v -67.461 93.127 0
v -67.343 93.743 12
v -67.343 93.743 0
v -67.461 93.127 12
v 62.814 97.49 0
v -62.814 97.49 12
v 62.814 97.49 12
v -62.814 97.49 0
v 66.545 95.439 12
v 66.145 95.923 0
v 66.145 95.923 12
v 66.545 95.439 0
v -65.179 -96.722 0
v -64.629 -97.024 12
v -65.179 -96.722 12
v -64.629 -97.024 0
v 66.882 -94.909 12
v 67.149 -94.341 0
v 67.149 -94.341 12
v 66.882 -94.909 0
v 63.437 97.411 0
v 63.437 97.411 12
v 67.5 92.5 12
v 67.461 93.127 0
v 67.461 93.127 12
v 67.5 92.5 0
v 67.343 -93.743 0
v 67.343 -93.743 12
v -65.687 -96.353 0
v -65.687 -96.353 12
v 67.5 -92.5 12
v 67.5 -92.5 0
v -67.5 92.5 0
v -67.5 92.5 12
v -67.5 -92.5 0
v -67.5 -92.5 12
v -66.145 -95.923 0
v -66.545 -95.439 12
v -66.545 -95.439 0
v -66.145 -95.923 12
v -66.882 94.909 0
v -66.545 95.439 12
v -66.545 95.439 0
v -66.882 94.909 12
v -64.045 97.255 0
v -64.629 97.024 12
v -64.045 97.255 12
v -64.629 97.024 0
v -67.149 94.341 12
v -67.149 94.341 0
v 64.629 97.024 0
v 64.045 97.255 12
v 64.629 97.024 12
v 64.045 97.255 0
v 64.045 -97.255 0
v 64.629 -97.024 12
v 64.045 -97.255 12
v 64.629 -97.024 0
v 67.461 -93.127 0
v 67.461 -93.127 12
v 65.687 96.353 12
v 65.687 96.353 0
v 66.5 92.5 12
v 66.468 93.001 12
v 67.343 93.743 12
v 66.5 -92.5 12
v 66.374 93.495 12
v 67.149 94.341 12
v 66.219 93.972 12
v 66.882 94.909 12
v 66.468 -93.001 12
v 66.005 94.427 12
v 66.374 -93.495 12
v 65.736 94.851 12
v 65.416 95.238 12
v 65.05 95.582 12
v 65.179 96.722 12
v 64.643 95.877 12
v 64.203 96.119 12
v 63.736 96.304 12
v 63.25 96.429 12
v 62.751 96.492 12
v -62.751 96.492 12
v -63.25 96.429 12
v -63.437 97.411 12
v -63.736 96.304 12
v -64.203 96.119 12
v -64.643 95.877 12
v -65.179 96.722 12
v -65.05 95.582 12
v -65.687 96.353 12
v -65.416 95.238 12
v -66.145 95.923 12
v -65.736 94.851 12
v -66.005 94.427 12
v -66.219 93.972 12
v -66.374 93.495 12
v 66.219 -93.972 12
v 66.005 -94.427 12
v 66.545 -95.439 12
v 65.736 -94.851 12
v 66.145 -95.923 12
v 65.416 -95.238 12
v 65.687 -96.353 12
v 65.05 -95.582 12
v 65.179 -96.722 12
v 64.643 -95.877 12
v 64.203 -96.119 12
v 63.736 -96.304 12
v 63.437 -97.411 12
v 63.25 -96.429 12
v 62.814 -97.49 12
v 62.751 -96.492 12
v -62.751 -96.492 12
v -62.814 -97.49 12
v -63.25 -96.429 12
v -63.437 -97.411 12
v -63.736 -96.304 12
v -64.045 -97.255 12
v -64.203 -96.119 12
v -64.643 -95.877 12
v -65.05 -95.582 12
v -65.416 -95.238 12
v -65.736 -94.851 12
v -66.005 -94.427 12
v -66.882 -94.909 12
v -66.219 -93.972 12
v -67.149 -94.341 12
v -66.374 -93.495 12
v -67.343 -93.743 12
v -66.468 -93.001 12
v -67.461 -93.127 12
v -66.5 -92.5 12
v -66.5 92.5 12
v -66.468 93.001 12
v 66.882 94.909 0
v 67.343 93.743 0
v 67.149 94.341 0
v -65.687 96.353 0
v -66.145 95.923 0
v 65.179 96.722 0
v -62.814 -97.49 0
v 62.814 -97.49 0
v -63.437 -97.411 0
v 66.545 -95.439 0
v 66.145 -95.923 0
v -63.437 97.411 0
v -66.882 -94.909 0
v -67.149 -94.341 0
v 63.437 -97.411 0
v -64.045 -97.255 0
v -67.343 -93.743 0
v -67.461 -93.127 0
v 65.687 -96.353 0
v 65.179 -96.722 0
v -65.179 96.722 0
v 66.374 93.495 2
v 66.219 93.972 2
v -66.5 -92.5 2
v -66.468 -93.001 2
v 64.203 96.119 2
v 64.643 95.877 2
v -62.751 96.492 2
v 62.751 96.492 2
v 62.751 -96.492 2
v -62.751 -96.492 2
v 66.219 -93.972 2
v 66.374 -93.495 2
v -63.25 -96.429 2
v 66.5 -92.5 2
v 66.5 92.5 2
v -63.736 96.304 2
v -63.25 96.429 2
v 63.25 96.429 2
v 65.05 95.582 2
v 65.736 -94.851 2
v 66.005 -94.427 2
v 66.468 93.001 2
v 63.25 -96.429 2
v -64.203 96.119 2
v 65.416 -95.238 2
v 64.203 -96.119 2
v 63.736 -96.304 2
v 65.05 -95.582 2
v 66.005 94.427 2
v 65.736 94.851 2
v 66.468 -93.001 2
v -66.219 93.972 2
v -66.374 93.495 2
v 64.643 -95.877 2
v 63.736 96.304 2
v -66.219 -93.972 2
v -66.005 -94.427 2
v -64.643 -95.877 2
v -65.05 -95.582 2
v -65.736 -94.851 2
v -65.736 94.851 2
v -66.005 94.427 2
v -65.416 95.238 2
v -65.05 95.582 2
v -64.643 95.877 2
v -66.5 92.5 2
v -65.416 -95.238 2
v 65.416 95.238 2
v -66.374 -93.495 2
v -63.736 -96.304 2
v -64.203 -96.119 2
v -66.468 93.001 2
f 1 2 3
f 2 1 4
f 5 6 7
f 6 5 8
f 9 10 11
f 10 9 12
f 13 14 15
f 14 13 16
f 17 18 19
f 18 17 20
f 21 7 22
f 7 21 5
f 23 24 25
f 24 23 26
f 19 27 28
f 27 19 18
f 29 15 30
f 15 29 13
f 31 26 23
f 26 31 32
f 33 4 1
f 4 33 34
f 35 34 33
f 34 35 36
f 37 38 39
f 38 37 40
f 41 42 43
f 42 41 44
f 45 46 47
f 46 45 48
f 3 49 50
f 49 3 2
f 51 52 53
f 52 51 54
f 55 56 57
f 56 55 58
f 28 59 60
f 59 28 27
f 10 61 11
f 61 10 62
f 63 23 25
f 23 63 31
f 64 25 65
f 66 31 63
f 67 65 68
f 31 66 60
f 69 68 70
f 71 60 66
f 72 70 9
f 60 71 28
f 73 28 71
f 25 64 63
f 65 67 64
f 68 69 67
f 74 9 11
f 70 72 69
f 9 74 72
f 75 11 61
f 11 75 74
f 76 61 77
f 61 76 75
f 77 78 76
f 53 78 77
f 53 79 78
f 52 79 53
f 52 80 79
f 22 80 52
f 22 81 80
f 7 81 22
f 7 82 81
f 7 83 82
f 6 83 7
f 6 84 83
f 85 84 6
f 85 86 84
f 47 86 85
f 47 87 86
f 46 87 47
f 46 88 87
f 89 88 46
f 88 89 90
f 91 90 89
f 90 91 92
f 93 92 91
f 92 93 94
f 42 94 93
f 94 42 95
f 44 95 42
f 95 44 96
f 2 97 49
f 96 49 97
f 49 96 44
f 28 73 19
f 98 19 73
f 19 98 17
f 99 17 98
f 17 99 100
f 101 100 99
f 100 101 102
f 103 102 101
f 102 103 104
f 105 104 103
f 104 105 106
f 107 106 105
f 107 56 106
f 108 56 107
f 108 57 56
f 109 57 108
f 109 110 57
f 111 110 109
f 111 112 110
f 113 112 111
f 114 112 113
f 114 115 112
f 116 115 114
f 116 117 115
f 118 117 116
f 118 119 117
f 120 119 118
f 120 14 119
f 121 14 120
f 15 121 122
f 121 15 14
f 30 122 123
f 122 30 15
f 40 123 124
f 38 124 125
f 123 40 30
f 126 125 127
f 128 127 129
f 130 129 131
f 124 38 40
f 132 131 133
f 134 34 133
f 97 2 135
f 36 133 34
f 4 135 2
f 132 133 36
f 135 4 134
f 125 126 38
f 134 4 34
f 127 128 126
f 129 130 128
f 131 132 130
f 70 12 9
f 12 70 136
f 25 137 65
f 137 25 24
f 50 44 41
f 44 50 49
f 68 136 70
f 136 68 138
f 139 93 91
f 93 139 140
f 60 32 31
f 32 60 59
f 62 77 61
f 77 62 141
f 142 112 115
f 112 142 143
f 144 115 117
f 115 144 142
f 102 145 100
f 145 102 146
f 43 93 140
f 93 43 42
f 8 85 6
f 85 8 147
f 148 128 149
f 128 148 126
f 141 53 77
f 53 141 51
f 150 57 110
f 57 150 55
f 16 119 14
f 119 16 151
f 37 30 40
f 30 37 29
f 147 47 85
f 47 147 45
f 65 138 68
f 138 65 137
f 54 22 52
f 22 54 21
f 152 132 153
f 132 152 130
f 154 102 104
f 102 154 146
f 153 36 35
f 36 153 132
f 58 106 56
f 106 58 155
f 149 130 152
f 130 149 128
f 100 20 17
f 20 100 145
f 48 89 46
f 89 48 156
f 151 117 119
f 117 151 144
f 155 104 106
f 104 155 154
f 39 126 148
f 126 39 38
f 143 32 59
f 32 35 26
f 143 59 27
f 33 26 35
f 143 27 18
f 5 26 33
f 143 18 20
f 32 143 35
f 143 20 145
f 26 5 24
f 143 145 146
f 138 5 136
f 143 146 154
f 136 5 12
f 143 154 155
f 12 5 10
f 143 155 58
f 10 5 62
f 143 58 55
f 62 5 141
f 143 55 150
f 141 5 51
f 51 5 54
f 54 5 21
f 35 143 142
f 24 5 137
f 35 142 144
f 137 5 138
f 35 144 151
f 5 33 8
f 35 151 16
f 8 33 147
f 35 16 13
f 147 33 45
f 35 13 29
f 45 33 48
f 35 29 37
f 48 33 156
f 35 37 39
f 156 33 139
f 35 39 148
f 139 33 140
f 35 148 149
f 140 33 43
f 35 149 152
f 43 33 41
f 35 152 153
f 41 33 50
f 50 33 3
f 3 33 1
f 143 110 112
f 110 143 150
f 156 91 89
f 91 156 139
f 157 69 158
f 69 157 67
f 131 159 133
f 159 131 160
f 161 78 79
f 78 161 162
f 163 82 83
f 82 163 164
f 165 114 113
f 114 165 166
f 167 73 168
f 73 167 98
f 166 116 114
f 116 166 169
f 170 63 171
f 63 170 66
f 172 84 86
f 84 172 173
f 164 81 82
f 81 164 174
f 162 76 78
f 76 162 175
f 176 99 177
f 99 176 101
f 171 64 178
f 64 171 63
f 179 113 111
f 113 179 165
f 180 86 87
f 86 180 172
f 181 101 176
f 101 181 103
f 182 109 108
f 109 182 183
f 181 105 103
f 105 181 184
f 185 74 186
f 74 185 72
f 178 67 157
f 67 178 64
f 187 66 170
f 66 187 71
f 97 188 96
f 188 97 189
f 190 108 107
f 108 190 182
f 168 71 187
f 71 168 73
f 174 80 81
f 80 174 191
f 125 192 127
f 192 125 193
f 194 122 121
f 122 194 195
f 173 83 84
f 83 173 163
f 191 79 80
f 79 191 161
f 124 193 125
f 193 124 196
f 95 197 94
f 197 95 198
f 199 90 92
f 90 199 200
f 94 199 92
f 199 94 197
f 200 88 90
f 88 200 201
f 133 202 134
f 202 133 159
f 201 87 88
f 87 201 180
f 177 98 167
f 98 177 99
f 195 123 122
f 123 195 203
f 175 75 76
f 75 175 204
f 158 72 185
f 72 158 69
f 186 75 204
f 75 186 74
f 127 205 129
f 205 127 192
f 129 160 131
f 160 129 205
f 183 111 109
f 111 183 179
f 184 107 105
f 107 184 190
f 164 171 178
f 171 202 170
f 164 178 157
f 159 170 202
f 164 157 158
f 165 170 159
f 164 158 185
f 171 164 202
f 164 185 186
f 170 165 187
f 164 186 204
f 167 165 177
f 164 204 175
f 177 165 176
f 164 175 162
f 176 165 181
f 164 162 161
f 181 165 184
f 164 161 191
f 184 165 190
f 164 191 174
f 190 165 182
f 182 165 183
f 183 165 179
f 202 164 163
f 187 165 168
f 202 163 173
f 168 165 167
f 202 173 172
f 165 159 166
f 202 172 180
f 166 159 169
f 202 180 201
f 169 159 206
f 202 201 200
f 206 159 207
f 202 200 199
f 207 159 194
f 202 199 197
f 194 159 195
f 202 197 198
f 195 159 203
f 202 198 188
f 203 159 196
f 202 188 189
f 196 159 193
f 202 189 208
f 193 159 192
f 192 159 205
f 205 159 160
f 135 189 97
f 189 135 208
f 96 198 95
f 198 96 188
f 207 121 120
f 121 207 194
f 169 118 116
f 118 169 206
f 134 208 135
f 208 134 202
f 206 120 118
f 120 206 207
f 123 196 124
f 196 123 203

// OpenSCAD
$fn = 50;


difference() {
	union() {
		hull() {
			translate(v = [-62.5000000000, 92.5000000000, 0]) {
				cylinder(h = 12, r = 5);
			}
			translate(v = [62.5000000000, 92.5000000000, 0]) {
				cylinder(h = 12, r = 5);
			}
			translate(v = [-62.5000000000, -92.5000000000, 0]) {
				cylinder(h = 12, r = 5);
			}
			translate(v = [62.5000000000, -92.5000000000, 0]) {
				cylinder(h = 12, r = 5);
			}
		}
	}
	union() {
		translate(v = [0, 0, 2]) {
			hull() {
				translate(v = [-62.5000000000, 92.5000000000, 0]) {
					cylinder(h = 10, r = 4);
				}
				translate(v = [62.5000000000, 92.5000000000, 0]) {
					cylinder(h = 10, r = 4);
				}
				translate(v = [-62.5000000000, -92.5000000000, 0]) {
					cylinder(h = 10, r = 4);
				}
				translate(v = [62.5000000000, -92.5000000000, 0]) {
					cylinder(h = 10, r = 4);
				}
			}
		}
	}
}
